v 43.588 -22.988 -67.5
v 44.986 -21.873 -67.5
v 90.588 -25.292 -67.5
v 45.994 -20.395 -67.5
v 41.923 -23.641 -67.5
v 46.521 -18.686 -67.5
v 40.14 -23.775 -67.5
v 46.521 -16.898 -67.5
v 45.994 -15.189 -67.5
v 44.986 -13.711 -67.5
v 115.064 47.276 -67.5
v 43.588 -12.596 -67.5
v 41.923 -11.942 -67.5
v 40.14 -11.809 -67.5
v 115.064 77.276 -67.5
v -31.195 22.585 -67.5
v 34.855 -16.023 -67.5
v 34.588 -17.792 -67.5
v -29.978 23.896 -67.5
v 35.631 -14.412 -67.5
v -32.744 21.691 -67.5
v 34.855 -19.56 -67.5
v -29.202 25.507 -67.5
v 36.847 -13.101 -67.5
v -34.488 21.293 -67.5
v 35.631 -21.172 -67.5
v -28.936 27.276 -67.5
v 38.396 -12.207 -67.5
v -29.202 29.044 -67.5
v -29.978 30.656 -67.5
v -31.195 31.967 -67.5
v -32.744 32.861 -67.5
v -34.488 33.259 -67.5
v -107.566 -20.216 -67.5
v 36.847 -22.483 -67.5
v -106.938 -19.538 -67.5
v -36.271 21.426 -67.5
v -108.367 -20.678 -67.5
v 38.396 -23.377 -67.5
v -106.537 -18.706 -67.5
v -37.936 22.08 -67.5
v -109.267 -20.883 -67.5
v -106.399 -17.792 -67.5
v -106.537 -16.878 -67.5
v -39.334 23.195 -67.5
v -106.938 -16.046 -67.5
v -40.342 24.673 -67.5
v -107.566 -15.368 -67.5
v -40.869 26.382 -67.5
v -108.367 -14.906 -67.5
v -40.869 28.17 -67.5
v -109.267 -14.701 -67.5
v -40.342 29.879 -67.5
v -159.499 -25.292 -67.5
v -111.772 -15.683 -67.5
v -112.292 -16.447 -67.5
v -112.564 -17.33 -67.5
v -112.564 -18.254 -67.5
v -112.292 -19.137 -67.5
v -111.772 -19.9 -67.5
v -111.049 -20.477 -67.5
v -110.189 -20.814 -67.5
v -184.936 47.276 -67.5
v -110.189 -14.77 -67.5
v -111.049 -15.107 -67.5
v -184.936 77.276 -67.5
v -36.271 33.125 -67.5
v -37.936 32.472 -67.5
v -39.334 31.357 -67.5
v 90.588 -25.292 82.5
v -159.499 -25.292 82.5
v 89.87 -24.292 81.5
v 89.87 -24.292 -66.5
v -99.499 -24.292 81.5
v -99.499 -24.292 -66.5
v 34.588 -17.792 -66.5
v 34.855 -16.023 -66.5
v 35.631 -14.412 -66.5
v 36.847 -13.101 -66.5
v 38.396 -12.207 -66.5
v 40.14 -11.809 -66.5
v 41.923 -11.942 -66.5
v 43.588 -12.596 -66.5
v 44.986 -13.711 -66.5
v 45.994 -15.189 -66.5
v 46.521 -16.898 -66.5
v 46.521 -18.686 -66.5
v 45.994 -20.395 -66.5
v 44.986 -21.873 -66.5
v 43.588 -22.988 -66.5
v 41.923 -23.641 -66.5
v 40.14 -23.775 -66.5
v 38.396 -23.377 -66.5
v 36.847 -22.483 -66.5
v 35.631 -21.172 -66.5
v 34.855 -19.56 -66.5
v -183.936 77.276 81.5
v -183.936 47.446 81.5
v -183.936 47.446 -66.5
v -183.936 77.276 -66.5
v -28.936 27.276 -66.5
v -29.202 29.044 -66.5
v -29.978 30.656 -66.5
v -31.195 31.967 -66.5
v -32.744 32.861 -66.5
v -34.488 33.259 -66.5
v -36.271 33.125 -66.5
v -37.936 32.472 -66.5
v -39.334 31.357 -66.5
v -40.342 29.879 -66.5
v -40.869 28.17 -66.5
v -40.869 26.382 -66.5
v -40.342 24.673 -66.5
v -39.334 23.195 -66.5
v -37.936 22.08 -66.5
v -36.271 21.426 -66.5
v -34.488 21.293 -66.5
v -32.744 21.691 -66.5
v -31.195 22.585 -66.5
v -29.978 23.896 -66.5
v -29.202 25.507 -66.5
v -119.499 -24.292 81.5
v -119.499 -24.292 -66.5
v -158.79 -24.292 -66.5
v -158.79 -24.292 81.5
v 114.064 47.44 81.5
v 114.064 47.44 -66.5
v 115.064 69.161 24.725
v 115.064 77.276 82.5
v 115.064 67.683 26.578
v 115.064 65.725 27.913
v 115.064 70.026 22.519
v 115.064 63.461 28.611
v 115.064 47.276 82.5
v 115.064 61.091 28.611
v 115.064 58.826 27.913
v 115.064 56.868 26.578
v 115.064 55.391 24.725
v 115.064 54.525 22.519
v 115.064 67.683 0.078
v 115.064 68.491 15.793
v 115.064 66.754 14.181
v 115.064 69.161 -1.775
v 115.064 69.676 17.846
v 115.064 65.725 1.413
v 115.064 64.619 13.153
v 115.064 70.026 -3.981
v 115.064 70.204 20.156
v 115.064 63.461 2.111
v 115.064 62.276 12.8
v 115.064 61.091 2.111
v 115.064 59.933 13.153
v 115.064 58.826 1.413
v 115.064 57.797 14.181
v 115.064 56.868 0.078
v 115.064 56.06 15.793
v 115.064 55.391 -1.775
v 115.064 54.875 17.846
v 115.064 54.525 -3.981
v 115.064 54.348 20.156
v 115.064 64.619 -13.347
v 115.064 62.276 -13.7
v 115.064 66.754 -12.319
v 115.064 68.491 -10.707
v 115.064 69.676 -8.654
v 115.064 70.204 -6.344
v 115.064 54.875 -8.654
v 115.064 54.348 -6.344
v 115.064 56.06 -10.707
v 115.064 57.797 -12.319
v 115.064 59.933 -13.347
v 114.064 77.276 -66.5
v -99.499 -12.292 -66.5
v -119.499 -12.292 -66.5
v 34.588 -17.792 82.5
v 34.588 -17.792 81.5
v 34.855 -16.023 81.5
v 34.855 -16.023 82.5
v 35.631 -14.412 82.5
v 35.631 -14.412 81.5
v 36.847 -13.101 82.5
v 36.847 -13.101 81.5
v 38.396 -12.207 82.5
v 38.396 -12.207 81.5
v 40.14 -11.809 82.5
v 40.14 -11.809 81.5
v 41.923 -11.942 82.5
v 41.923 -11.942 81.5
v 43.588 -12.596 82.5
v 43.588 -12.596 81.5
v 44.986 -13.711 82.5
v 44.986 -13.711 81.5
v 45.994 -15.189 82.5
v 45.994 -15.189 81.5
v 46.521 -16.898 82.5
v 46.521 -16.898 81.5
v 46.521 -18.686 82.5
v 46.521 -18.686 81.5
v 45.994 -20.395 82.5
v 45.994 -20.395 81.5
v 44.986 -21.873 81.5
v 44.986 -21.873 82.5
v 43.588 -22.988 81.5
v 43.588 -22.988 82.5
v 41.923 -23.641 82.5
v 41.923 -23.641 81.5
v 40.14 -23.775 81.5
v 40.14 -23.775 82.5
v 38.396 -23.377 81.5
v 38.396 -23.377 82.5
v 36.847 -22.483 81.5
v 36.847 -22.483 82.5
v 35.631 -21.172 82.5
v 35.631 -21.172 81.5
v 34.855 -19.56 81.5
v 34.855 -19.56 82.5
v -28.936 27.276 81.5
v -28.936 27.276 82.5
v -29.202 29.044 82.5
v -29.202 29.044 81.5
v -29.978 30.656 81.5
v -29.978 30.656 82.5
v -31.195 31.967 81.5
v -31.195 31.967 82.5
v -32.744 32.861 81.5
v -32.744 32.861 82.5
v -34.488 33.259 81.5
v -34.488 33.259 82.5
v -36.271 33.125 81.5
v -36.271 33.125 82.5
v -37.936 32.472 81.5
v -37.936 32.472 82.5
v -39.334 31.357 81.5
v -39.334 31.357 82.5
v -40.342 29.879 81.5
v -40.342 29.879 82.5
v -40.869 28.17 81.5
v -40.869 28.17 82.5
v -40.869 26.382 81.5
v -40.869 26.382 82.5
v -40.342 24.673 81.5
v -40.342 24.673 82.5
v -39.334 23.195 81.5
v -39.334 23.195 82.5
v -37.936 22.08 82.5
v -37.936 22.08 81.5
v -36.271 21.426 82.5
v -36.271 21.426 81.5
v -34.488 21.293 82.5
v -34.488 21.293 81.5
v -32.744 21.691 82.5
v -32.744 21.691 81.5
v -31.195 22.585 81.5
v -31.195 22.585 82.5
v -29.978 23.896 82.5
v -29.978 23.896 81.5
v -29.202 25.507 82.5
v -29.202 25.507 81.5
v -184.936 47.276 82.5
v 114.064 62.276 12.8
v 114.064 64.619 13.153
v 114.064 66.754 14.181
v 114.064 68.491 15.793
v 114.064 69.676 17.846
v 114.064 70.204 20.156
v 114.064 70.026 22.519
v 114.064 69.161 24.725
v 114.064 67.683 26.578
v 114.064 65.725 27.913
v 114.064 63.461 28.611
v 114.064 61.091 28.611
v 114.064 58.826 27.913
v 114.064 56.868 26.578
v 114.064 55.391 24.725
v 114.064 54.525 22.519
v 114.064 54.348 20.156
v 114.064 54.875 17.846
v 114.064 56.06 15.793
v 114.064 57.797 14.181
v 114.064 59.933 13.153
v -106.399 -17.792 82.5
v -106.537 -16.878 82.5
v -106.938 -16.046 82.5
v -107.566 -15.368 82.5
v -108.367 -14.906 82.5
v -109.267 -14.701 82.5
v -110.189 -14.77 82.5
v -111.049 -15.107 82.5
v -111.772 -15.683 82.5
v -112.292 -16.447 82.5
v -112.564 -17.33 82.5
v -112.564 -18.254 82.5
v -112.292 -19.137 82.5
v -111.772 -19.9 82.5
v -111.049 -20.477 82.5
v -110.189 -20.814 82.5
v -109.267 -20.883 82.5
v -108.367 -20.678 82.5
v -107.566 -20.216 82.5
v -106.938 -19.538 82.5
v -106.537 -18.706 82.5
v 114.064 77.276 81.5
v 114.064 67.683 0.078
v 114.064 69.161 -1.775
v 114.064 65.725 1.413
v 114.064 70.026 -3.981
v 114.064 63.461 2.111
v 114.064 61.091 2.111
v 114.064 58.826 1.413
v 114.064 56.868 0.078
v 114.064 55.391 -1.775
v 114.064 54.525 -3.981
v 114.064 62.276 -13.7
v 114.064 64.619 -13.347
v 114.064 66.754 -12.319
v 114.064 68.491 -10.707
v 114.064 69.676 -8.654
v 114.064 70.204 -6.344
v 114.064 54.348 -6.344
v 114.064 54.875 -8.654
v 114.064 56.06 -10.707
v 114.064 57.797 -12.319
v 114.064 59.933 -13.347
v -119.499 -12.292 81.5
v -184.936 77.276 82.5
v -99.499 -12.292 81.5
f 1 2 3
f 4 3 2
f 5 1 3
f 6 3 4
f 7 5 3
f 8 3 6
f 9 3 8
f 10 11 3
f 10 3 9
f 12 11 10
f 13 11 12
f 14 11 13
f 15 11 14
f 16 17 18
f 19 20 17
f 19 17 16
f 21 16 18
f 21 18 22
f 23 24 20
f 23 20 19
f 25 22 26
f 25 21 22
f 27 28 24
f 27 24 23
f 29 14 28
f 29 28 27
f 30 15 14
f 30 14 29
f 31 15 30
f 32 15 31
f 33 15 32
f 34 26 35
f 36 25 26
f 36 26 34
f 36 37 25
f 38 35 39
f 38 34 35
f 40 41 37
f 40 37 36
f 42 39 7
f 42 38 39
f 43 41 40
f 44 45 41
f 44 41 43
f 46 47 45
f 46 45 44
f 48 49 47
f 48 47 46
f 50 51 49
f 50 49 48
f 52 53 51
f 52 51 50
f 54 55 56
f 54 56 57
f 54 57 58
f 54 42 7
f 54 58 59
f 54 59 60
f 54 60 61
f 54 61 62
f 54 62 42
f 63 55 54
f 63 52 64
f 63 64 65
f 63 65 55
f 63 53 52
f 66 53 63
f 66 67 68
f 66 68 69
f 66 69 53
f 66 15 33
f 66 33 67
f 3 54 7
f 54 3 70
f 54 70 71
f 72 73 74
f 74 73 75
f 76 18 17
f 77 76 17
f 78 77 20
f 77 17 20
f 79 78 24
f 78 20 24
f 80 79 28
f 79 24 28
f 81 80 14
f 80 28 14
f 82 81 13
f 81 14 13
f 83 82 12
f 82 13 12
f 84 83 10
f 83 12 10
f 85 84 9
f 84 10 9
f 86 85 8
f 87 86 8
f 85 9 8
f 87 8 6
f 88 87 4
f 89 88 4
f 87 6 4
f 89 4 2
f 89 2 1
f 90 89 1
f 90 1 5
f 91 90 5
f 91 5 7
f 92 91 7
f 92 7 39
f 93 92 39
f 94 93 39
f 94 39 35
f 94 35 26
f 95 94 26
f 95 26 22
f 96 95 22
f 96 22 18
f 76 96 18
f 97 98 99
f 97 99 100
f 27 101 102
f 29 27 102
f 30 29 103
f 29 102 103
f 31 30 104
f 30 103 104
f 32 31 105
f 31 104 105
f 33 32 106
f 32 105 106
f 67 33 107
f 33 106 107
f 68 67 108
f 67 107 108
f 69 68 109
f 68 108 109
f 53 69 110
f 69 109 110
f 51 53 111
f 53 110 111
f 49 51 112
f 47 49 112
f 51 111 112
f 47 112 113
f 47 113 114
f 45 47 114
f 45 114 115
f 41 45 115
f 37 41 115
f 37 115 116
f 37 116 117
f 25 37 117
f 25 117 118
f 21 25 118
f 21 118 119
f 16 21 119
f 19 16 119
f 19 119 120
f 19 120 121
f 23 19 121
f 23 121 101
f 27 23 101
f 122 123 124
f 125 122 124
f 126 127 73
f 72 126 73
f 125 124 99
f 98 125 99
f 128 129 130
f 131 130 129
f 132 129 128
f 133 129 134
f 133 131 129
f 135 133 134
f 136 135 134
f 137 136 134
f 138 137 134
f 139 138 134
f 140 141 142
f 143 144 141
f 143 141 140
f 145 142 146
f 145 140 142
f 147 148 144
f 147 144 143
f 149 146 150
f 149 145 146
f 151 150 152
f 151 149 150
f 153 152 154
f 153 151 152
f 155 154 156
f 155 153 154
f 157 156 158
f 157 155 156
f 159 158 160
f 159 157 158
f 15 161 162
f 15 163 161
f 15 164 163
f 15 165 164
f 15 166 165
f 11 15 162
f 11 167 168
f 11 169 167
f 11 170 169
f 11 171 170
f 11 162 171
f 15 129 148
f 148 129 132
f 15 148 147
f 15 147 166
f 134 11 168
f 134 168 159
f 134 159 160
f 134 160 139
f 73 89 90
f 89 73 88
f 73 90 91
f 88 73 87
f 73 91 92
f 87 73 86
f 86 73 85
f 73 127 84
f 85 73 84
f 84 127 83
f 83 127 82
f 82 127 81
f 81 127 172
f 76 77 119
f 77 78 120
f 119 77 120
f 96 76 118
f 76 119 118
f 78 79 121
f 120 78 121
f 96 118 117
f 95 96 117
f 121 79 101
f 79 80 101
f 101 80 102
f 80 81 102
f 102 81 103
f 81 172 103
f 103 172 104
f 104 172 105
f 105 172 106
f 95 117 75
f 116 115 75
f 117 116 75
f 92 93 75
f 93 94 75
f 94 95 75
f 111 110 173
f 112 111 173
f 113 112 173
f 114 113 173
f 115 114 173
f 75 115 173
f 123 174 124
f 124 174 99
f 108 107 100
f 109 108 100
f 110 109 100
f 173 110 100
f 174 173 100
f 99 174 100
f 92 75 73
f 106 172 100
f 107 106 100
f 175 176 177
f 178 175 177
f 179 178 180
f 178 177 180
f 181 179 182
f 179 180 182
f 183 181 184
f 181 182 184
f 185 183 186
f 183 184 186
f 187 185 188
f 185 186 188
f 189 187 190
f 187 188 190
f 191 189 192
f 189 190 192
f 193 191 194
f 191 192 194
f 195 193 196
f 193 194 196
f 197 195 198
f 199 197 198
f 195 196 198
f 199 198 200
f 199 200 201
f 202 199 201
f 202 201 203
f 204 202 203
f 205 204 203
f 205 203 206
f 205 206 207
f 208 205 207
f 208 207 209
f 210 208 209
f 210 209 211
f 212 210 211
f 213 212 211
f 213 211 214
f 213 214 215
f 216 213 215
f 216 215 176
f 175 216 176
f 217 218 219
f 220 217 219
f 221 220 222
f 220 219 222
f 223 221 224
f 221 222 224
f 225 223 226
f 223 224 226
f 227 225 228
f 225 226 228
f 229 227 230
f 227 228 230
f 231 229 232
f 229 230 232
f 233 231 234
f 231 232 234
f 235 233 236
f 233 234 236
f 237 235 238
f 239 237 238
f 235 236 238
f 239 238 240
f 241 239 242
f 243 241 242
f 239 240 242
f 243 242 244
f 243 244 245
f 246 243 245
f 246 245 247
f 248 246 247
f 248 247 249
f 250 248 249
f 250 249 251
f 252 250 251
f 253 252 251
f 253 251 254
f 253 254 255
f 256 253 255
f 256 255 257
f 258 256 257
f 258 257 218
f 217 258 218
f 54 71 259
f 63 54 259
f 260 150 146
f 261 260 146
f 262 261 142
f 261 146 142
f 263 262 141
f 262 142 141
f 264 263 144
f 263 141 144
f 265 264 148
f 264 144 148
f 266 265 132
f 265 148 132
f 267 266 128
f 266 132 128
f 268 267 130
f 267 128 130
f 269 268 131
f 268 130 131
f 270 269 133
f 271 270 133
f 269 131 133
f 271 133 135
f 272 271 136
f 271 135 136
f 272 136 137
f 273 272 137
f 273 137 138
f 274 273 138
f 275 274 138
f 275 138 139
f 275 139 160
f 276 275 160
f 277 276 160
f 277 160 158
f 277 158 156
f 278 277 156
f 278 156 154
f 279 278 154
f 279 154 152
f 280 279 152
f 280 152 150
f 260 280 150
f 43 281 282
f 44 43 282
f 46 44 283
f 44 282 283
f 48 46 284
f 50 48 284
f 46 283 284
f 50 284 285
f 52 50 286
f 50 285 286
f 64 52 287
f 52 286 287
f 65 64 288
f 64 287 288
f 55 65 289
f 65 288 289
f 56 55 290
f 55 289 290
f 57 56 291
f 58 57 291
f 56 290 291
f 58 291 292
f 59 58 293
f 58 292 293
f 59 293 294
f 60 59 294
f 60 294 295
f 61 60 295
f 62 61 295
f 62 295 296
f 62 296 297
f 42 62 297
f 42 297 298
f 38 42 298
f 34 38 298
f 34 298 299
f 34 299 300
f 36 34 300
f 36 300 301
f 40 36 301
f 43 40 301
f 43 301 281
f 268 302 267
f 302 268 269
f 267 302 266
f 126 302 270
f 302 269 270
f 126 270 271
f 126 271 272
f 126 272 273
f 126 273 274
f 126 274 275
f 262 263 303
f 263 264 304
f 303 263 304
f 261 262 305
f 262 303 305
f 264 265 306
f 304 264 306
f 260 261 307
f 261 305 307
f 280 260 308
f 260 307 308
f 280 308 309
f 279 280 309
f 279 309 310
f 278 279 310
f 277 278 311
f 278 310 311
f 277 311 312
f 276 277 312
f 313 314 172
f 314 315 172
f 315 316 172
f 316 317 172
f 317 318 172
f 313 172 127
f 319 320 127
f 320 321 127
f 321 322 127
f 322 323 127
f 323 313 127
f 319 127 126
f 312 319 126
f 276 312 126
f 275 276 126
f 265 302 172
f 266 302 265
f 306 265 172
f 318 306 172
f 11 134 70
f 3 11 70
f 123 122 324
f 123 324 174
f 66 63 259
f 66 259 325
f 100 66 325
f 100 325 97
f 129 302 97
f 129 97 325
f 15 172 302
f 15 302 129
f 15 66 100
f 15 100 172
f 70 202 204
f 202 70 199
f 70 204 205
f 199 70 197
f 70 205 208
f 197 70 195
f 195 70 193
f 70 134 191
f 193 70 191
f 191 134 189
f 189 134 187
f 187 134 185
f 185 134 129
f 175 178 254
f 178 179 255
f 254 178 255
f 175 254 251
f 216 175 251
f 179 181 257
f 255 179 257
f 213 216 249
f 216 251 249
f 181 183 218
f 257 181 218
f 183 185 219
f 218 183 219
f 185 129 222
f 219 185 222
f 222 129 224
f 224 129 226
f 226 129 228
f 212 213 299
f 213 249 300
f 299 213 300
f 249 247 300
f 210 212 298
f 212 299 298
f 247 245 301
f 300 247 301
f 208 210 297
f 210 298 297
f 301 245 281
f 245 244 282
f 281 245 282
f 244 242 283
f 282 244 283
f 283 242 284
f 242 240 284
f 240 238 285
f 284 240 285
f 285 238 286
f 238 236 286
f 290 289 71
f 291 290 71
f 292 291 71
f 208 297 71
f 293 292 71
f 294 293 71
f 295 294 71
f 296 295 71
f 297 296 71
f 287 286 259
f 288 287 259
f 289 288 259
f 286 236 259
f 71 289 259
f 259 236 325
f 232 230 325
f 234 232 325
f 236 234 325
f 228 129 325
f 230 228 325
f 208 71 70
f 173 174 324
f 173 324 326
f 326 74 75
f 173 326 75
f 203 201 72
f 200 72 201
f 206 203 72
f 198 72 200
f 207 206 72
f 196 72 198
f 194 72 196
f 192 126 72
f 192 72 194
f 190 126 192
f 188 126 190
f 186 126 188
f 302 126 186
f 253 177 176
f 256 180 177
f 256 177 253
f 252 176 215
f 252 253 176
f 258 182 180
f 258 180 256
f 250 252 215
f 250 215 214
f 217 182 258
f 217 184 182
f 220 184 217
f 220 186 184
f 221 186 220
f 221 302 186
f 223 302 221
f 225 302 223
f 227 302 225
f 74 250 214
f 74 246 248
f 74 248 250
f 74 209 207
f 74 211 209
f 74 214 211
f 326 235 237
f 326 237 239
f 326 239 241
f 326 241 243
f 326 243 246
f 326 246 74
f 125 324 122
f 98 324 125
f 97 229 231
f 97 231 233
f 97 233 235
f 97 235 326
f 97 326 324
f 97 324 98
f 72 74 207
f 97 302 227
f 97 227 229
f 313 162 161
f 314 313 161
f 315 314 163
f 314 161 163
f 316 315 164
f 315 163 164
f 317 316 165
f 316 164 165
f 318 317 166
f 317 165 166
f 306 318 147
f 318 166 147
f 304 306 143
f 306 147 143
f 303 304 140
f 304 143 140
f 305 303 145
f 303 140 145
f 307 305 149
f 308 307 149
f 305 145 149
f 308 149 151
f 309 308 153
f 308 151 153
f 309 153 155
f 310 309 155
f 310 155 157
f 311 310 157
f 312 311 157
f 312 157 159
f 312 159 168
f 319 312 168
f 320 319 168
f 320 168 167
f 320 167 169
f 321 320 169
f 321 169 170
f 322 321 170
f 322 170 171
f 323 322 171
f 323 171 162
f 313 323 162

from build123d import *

# Parameters (mm, degrees)
BOSS_EXTRUDE1_DEPTH     = 15
SCALE4_SCALE            = 10
SHELL3_T                = -1
SKETCH7_R               = 2.5
CUT_EXTRUDE2_DEPTH      = 1
CUT_EXTRUDE2_DEPTH_BACK = 151
SKETCH8_R               = 2.5
CUT_EXTRUDE3_DEPTH      = 1
CUT_EXTRUDE3_DEPTH_BACK = 151
SKETCH11_R              = 6
CUT_EXTRUDE5_DEPTH      = 1
CUT_EXTRUDE5_DEPTH_BACK = 151
SKETCH12_R              = 6
CUT_EXTRUDE6_DEPTH      = 1
CUT_EXTRUDE6_DEPTH_BACK = 151
SKETCH19_W              = 20
SKETCH19_H              = 148
BOSS_EXTRUDE6_DEPTH     = 12
SKETCH6_R               = 3.1
CUT_EXTRUDE9_DEPTH      = 1
CUT_EXTRUDE9_DEPTH_BACK = 151
SKETCH22_R              = 7.95
CUT_EXTRUDE10_DEPTH     = 2


with BuildPart() as part:
    # Sketch1 → Boss-Extrude1 (new body)
    with BuildSketch(Plane.XY):
        Polygon((-49.791399094, 32.645333647), (-19.791399094, 32.645333647), (-19.791399094, 29.645333647), (-22.238991949, 22.388566018), (-47.247714564, 22.388566018), (-49.791399094, 29.645333647), align=None)
    extrude(amount=BOSS_EXTRUDE1_DEPTH)


with BuildPart() as part_1:
    # Scale4: scaled about (-34.775342822, 27.686391484, 7.5)
    add(part.part.scale(SCALE4_SCALE).moved(Location((312.978085398, -249.177523356, -67.5))))

    # Shell3
    shell3_openings = [part_1.faces().sort_by_distance(p)[0] for p in [
        (-34.935905541, 77.275813113, 7.5),
    ]]
    offset(amount=SHELL3_T, openings=shell3_openings, kind=Kind.INTERSECTION)

    # Sketch7 → Cut-Extrude2 (cut, two sides)
    with BuildSketch(Plane.XY.offset(82.5)) as cut_extrude2_sk:
        with Locations((40.588165903, -17.79186318)):
            Circle(SKETCH7_R)
    extrude(amount=CUT_EXTRUDE2_DEPTH, mode=Mode.SUBTRACT)
    extrude(cut_extrude2_sk.sketch, amount=-CUT_EXTRUDE2_DEPTH_BACK, mode=Mode.SUBTRACT)

    # Sketch8 → Cut-Extrude3 (cut, two sides)
    with BuildSketch(Plane.XY.offset(82.5)) as cut_extrude3_sk:
        with Locations((-34.935905541, 27.275813113)):
            Circle(SKETCH8_R)
    extrude(amount=CUT_EXTRUDE3_DEPTH, mode=Mode.SUBTRACT)
    extrude(cut_extrude3_sk.sketch, amount=-CUT_EXTRUDE3_DEPTH_BACK, mode=Mode.SUBTRACT)

    # Sketch11 → Cut-Extrude5 (cut, two sides)
    with BuildSketch(Plane(origin=(0, 0, -67.5), x_dir=(-1, 0, 0), z_dir=(0, 0, -1))) as cut_extrude5_sk:
        with Locations((-40.588165903, -17.79186318)):
            Circle(SKETCH11_R)
    extrude(amount=CUT_EXTRUDE5_DEPTH, mode=Mode.SUBTRACT)
    extrude(cut_extrude5_sk.sketch, amount=-CUT_EXTRUDE5_DEPTH_BACK, mode=Mode.SUBTRACT)

    # Sketch12 → Cut-Extrude6 (cut, two sides)
    with BuildSketch(Plane.XY.offset(82.5)) as cut_extrude6_sk:
        with Locations((-34.935905541, 27.275813113)):
            Circle(SKETCH12_R)
    extrude(amount=CUT_EXTRUDE6_DEPTH, mode=Mode.SUBTRACT)
    extrude(cut_extrude6_sk.sketch, amount=-CUT_EXTRUDE6_DEPTH_BACK, mode=Mode.SUBTRACT)

    # Sketch19 → Boss-Extrude6 (add)
    with BuildSketch(Plane(origin=(0, -24.29186318, 0), x_dir=(1, 0, 0), z_dir=(0, 1, 0))):
        with Locations((-109.499060243, -7.5)):
            Rectangle(SKETCH19_W, SKETCH19_H)
    extrude(amount=BOSS_EXTRUDE6_DEPTH)

    # Sketch6 → Cut-Extrude9 (cut, two sides)
    with BuildSketch(Plane.XY.offset(82.5)) as cut_extrude9_sk:
        with Locations((-109.499060243, -17.79186318)):
            Circle(SKETCH6_R)
    extrude(amount=CUT_EXTRUDE9_DEPTH, mode=Mode.SUBTRACT)
    extrude(cut_extrude9_sk.sketch, amount=-CUT_EXTRUDE9_DEPTH_BACK, mode=Mode.SUBTRACT)

    # Sketch22 → Cut-Extrude10 (cut)
    with BuildSketch(Plane(origin=(115.064094459, 0, 0), x_dir=(0, 0, -1), z_dir=(1, 0, 0))):
        with Locations((-20.75, 62.275813113)):
            Circle(SKETCH22_R)
        with Locations((5.75, 62.275813113)):
            Circle(SKETCH22_R)
    extrude(amount=-CUT_EXTRUDE10_DEPTH, mode=Mode.SUBTRACT)


solid = part_1.part
